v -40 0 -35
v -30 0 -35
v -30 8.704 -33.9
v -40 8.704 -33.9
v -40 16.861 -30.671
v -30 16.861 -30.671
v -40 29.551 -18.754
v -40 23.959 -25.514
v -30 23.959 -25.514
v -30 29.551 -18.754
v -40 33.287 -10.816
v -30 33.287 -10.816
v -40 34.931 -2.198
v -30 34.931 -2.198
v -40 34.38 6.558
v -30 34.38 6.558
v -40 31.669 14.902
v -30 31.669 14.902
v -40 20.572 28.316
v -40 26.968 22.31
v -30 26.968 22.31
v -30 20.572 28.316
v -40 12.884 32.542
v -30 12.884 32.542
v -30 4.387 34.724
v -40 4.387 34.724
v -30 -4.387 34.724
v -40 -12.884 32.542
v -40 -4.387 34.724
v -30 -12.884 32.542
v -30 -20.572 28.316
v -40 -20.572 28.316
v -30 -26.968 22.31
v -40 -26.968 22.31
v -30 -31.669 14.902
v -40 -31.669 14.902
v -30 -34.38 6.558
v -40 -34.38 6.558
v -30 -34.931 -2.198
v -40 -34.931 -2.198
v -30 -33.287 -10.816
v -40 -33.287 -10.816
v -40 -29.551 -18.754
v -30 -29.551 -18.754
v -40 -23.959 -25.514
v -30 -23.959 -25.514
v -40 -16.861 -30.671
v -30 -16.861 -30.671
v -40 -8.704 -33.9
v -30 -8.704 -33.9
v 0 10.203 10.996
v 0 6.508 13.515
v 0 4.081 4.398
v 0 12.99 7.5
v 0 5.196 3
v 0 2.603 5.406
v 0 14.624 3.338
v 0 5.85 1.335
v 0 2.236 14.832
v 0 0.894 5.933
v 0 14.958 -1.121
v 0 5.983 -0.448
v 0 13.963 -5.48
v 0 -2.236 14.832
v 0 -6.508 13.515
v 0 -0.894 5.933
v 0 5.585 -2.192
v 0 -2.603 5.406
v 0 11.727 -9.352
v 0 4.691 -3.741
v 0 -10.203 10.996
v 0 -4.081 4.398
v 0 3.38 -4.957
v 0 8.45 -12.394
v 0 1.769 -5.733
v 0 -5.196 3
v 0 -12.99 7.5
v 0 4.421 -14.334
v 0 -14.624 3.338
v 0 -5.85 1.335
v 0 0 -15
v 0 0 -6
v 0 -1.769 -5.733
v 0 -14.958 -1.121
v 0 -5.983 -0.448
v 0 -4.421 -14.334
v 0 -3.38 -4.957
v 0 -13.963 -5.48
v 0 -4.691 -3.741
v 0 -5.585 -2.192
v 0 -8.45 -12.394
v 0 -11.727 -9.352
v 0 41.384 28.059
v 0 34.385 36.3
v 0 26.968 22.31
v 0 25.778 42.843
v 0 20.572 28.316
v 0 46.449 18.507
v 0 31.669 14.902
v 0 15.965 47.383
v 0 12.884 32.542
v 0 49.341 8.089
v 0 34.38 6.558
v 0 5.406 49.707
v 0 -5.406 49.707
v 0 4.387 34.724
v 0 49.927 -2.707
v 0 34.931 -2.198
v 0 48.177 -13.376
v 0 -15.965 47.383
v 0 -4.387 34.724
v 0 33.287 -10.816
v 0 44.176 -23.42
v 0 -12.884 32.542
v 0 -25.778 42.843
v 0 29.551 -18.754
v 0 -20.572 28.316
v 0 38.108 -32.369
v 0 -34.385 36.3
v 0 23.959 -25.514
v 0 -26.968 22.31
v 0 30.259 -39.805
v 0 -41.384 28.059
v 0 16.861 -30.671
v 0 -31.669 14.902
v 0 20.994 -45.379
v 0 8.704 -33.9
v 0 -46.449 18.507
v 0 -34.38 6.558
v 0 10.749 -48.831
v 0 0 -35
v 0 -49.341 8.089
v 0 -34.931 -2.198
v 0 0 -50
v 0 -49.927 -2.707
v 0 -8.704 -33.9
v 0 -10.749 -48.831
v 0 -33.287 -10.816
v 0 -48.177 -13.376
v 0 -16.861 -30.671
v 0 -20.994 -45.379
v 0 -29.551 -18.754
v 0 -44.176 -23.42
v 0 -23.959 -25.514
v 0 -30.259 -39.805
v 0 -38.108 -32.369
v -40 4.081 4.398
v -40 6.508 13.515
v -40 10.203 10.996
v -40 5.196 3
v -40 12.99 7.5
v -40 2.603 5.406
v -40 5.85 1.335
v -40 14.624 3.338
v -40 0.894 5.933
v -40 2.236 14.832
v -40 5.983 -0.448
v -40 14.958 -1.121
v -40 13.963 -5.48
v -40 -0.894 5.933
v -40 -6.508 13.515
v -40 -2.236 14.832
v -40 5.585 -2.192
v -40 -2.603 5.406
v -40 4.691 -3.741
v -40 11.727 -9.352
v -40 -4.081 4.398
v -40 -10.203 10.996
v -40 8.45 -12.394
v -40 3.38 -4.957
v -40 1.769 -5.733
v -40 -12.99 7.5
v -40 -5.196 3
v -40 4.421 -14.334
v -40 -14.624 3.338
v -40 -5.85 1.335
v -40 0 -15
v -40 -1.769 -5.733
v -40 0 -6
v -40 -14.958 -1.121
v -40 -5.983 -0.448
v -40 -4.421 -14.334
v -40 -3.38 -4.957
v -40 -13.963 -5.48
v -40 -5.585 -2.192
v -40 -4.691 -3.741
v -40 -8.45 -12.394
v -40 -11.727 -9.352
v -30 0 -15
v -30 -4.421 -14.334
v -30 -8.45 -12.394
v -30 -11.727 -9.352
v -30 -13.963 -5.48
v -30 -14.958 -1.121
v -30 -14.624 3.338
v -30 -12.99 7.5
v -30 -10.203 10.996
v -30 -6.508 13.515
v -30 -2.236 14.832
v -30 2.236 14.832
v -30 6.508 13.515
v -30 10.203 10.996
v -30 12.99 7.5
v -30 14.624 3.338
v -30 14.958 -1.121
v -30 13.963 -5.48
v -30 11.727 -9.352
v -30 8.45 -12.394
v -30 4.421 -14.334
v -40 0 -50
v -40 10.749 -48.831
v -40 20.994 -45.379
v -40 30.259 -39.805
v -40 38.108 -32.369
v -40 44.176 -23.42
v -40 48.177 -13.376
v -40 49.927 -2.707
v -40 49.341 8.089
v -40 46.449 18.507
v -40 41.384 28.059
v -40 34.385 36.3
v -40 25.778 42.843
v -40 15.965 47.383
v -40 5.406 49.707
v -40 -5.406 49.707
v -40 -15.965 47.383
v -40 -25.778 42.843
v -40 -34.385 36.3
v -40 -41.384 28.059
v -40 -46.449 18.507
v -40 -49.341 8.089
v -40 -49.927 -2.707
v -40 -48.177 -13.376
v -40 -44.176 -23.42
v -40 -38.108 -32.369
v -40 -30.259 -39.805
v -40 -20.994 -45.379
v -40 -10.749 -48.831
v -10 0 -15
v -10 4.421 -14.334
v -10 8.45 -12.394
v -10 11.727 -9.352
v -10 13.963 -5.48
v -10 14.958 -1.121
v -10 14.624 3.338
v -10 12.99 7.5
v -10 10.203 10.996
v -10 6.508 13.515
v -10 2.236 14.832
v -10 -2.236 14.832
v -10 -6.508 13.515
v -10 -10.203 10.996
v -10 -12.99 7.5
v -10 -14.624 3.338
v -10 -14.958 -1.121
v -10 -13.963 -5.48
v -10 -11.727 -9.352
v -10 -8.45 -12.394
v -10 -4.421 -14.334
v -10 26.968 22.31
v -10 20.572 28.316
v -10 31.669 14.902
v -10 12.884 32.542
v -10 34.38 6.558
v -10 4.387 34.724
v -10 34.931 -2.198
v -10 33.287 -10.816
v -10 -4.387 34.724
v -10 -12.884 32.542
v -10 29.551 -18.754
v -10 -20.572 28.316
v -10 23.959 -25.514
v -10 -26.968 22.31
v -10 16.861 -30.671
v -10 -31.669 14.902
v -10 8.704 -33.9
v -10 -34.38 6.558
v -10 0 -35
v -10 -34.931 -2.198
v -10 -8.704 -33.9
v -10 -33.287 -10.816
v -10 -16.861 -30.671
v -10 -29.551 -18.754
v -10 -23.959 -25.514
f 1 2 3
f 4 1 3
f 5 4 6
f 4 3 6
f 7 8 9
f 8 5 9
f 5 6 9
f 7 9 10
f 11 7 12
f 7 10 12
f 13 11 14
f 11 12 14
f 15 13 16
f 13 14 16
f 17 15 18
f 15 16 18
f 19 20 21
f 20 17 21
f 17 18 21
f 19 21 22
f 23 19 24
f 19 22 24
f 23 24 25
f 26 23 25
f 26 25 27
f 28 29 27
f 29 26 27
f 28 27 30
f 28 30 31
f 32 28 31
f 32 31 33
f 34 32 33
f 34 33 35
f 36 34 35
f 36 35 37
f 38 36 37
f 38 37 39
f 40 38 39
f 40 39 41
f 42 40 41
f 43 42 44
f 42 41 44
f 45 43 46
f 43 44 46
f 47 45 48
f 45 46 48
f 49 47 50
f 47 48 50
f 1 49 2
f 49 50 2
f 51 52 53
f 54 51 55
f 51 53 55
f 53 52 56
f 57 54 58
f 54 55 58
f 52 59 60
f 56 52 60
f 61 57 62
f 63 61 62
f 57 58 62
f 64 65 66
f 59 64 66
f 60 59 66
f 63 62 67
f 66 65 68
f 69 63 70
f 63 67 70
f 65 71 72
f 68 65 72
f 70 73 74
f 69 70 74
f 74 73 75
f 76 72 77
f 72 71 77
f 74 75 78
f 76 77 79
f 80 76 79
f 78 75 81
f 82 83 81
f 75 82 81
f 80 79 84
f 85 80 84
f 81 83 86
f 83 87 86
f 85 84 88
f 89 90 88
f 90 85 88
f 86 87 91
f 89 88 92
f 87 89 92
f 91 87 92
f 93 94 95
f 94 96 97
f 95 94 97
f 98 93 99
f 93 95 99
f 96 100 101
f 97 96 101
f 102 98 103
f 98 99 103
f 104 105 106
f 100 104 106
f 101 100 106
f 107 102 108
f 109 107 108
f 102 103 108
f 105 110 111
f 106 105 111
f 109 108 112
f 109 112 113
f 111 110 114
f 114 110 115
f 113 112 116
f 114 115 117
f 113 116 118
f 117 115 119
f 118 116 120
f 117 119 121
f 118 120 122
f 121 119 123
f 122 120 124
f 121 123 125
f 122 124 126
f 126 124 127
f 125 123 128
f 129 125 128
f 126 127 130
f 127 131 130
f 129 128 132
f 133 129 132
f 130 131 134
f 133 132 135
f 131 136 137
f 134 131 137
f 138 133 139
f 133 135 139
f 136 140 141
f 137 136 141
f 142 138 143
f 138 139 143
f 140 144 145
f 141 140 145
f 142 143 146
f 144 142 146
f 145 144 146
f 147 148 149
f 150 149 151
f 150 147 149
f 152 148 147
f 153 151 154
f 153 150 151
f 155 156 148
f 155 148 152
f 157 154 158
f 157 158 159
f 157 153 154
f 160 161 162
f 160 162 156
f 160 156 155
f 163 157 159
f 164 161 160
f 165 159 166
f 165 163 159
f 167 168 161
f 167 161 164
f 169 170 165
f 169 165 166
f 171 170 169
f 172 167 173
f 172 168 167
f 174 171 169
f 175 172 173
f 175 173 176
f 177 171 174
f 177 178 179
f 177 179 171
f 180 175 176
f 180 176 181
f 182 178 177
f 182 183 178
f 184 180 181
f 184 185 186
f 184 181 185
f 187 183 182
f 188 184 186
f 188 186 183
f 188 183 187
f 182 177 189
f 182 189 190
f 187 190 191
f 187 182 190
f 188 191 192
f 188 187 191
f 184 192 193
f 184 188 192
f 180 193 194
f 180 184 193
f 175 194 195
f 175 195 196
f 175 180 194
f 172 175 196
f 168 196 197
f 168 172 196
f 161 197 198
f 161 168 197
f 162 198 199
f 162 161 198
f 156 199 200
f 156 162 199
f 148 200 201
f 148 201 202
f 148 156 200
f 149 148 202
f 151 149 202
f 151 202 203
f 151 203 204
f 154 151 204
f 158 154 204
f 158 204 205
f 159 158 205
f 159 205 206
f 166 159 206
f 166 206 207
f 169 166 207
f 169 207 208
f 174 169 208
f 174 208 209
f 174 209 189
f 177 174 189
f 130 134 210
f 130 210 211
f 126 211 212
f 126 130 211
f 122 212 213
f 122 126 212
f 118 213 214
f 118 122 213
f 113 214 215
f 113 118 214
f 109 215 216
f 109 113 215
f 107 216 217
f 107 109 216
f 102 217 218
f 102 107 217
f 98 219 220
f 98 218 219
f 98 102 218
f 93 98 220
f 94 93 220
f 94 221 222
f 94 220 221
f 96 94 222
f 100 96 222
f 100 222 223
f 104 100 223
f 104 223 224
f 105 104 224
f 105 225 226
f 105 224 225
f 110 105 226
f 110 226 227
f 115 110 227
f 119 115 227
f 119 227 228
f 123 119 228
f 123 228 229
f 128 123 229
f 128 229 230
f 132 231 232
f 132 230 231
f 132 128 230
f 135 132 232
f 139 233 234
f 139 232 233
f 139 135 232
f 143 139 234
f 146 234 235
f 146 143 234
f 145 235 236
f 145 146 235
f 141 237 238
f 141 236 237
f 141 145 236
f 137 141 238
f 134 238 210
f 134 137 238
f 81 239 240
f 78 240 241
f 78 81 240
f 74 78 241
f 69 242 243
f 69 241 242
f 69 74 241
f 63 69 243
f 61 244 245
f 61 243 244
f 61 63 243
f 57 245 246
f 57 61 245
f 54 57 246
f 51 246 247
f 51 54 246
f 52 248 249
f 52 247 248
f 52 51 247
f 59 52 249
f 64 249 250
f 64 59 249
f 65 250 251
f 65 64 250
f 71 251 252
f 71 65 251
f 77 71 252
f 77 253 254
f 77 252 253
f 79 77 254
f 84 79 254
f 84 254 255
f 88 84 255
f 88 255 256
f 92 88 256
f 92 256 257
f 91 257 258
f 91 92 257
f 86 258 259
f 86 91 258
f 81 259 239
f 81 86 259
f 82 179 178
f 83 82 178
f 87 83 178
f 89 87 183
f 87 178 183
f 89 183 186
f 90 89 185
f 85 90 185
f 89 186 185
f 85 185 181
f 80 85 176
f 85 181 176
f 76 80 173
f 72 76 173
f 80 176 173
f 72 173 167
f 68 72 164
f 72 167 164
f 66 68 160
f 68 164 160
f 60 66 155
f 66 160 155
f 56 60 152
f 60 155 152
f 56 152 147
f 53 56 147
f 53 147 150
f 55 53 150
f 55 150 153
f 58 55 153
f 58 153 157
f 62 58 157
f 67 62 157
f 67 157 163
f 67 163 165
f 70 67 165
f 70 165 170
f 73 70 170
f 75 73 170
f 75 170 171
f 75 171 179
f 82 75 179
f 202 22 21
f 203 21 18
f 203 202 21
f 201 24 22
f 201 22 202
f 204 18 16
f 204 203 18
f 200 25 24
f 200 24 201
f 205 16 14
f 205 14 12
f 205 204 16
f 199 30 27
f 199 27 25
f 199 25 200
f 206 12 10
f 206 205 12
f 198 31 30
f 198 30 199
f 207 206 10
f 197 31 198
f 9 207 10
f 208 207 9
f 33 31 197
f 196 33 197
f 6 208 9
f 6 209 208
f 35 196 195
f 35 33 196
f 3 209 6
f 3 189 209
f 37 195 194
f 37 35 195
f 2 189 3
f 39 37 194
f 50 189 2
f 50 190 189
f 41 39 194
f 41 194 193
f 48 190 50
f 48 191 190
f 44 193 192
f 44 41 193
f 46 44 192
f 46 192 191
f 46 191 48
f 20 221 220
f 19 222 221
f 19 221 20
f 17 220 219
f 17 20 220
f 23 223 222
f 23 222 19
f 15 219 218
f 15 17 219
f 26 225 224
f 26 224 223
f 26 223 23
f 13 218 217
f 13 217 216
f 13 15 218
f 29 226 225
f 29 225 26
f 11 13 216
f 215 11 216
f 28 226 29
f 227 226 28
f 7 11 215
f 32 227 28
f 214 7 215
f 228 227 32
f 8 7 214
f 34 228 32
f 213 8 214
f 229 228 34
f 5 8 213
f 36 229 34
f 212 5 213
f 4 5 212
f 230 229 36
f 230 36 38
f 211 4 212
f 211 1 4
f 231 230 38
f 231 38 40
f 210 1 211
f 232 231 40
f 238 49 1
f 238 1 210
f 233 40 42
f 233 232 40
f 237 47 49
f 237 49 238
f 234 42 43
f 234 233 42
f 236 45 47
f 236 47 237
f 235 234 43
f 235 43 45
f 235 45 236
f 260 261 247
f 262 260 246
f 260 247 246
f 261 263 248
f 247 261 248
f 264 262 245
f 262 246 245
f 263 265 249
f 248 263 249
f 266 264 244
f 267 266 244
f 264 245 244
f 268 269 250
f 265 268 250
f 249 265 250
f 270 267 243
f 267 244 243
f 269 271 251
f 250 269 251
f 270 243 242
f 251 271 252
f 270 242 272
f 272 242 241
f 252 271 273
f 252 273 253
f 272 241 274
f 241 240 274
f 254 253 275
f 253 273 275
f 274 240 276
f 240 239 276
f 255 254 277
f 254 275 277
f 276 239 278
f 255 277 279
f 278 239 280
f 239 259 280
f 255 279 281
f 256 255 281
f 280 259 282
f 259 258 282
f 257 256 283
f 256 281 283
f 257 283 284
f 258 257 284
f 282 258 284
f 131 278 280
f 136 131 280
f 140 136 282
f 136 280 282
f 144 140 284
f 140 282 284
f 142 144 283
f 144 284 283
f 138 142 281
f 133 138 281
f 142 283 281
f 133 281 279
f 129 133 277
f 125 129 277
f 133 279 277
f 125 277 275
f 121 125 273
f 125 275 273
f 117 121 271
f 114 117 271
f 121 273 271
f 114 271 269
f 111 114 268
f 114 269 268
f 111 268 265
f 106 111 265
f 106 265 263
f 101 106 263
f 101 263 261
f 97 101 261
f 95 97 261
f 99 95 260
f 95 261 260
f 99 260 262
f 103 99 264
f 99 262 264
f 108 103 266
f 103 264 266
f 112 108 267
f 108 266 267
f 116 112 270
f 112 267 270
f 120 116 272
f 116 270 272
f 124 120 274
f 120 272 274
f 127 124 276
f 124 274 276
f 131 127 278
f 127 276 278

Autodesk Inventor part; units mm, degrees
ref_plane "YZ Plane" through (0, 0, 0) normal (1, 0, 0) x (0, 1, 0)
ref_plane "XZ Plane" through (0, 0, 0) normal (0, 1, 0) x (-1, 0, 0)
ref_plane "XY Plane" through (0, 0, 0) normal (0, 0, 1) x (1, 0, 0)
sketch "Sketch1" plane through (0, 0, 0) normal (0, 1, 0) x (-1, 0, 0)
  line L0 (0, 0) -> (0, -6) construction
  line L1 (0, -6) -> (40, -6)
  line L2 (40, -6) -> (40, -50) construction
  line L3 (40, -50) -> (0, -50)
  line L4 (0, -50) -> (0, -35)
  line L5 (0, -35) -> (10, -35)
  line L6 (10, -35) -> (10, -15)
  line L7 (10, -15) -> (0, -15)
  line L8 (0, -15) -> (0, -6)
  line L9 (20, -6) -> (20, -50) construction
  line L10 (40, -50) -> (40, -35)
  line L11 (40, -35) -> (30, -35)
  line L12 (30, -35) -> (30, -15)
  line L13 (30, -15) -> (40, -15)
  line L14 (40, -15) -> (40, -6)
  line L15 (0, 0) -> (40, 0) construction
  dimension "d0" = 6
  dimension "d1" = 40
  dimension "d2" = 44
  dimension "d3" = 15
  dimension "d4" = 10
  dimension "d5" = 20
revolve "Revolution1" add sketch "Sketch1" angle 360 about axis through (0, 0, 0) along (-1, 0, 0)
properties part number "KZ"
